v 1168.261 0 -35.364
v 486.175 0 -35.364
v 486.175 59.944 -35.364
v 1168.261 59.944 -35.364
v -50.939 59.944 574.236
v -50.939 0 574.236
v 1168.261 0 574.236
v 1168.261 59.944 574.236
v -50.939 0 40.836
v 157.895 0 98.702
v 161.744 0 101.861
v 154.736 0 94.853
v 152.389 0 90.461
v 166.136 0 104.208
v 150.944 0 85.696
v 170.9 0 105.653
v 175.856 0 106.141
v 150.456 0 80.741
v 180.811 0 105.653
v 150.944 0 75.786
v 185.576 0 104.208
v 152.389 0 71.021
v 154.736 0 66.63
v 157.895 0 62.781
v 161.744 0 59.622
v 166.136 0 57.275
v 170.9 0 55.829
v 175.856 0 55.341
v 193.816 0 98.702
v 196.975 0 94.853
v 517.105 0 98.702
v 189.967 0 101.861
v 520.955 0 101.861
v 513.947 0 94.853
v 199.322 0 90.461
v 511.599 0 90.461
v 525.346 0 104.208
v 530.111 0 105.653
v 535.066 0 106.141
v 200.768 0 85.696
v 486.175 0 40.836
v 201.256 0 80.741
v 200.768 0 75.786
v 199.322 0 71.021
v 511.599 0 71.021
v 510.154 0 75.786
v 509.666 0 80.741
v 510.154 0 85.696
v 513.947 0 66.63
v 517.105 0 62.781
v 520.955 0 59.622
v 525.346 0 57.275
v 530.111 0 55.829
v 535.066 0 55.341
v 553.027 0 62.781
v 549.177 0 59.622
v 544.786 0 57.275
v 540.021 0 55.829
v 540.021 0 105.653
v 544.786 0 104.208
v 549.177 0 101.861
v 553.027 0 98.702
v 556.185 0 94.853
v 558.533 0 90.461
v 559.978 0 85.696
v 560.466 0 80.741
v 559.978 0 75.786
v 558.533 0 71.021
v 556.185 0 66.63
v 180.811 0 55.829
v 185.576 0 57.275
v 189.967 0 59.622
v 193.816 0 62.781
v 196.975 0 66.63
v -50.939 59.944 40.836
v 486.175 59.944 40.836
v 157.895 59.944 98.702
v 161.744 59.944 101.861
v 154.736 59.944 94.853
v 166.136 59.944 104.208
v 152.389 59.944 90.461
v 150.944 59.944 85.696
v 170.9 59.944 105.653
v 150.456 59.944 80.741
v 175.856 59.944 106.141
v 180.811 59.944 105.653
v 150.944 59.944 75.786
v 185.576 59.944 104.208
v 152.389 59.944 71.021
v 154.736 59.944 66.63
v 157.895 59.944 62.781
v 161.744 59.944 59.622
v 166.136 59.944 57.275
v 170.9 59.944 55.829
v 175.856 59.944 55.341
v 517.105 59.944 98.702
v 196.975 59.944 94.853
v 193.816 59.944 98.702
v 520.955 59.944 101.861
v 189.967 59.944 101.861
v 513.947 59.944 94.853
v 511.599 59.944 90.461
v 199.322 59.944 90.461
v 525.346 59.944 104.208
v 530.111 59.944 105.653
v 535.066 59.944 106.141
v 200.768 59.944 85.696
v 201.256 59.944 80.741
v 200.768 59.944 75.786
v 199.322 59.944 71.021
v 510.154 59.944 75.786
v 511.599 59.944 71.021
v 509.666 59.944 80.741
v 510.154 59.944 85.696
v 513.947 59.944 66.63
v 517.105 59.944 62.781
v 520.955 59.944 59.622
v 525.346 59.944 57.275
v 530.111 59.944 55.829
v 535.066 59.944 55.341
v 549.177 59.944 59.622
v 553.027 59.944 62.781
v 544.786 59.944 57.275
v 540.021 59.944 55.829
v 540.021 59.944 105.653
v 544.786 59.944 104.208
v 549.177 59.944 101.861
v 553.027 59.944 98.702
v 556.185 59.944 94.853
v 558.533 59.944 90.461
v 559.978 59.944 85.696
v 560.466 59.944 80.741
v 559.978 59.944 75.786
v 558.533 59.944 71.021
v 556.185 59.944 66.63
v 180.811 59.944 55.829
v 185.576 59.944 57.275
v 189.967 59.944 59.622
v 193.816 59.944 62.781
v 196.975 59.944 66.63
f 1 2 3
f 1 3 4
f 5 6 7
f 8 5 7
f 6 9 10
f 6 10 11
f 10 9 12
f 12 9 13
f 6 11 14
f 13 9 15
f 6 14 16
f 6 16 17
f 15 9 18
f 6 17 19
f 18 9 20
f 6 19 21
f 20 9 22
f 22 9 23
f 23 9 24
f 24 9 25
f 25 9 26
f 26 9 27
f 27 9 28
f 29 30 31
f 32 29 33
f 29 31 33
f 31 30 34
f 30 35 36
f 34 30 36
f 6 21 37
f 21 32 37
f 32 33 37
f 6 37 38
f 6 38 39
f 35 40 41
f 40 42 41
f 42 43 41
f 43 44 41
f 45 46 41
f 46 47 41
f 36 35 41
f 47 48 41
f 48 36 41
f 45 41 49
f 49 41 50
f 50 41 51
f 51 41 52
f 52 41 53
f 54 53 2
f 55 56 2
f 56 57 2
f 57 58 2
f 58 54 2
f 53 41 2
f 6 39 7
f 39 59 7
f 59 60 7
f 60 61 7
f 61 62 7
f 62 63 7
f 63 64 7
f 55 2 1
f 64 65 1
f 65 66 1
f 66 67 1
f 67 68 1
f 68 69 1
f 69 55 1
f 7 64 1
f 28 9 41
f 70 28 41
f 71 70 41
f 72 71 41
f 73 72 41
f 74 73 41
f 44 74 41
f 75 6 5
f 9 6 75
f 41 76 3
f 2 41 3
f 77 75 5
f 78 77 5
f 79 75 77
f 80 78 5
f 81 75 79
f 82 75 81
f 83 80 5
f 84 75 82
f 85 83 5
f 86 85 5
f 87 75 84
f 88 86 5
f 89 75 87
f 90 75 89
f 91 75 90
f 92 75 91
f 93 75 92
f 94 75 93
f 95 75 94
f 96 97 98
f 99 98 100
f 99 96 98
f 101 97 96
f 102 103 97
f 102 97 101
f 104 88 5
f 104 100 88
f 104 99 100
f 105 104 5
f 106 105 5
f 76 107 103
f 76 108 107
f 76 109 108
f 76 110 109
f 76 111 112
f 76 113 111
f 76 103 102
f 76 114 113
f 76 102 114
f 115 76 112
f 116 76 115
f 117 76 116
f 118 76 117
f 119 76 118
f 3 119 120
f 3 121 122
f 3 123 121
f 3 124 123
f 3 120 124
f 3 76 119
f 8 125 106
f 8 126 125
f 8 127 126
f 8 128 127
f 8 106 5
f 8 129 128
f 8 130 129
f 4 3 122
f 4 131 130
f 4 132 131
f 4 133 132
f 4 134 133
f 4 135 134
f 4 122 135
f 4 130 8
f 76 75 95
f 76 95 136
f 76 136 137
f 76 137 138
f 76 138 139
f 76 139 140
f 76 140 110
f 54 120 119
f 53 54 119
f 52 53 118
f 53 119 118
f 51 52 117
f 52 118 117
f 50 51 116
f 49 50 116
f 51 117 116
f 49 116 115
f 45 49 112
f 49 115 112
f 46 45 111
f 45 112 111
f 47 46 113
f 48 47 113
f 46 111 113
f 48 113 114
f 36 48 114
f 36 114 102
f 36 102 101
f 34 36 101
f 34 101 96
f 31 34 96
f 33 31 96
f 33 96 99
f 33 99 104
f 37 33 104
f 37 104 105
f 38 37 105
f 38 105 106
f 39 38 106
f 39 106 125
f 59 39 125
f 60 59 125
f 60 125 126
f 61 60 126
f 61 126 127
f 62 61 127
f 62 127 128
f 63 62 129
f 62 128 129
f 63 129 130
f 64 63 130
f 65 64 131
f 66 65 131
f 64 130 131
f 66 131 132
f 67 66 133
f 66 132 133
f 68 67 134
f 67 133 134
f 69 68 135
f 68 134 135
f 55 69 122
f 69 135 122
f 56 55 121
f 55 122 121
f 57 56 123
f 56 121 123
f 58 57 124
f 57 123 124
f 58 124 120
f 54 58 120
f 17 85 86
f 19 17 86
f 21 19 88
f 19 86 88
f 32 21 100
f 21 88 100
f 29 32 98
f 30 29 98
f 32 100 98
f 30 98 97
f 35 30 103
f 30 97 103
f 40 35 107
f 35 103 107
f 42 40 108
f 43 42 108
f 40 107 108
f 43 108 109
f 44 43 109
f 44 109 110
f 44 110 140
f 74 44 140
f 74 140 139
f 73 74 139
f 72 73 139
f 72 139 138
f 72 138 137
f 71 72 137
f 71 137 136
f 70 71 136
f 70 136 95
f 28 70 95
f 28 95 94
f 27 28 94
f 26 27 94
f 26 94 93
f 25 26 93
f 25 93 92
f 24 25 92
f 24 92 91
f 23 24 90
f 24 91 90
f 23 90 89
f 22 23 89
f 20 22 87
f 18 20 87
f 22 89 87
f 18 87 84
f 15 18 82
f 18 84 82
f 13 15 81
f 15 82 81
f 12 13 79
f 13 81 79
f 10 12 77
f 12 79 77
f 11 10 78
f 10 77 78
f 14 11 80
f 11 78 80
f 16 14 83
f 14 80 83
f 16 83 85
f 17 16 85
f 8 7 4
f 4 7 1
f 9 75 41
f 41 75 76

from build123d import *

# Parameters (mm, degrees)
SKETCH1_W      = 1219.2
SKETCH1_H      = 609.6
EXTRUDE1_DEPTH = 59.944
SKETCH9_W      = 641.290586706
SKETCH9_H      = 96.25128706
EXTRUDE2_DEPTH = 1304.139971926
SKETCH10_R     = 25.4
EXTRUDE3_DEPTH = 1304.139971926


with BuildPart() as part:
    # Sketch1 → Extrude1 (new body)
    with BuildSketch(Plane(origin=(0, 0, 0), x_dir=(1, 0, 0), z_dir=(0, 1, 0))):
        with Locations((558.660869819, -269.436051937)):
            Rectangle(SKETCH1_W, SKETCH1_H)
    extrude(amount=EXTRUDE1_DEPTH)

    # Sketch9 → Extrude2 (cut, through all)
    with BuildSketch(Plane(origin=(0, 59.944, 0), x_dir=(1, 0, 0), z_dir=(0, 1, 0))):
        with Locations((165.530071427, 7.289591593)):
            Rectangle(SKETCH9_W, SKETCH9_H)
    extrude(amount=-EXTRUDE2_DEPTH, mode=Mode.SUBTRACT)

    # Sketch10 → Extrude3 (cut, through all)
    with BuildSketch(Plane(origin=(0, 59.944, 0), x_dir=(1, 0, 0), z_dir=(0, 1, 0))):
        with Locations((175.855747398, -80.741174358)):
            Circle(SKETCH10_R)
        with Locations((535.065992241, -80.741174358)):
            Circle(SKETCH10_R)
    extrude(amount=-EXTRUDE3_DEPTH, mode=Mode.SUBTRACT)


solid = part.part
